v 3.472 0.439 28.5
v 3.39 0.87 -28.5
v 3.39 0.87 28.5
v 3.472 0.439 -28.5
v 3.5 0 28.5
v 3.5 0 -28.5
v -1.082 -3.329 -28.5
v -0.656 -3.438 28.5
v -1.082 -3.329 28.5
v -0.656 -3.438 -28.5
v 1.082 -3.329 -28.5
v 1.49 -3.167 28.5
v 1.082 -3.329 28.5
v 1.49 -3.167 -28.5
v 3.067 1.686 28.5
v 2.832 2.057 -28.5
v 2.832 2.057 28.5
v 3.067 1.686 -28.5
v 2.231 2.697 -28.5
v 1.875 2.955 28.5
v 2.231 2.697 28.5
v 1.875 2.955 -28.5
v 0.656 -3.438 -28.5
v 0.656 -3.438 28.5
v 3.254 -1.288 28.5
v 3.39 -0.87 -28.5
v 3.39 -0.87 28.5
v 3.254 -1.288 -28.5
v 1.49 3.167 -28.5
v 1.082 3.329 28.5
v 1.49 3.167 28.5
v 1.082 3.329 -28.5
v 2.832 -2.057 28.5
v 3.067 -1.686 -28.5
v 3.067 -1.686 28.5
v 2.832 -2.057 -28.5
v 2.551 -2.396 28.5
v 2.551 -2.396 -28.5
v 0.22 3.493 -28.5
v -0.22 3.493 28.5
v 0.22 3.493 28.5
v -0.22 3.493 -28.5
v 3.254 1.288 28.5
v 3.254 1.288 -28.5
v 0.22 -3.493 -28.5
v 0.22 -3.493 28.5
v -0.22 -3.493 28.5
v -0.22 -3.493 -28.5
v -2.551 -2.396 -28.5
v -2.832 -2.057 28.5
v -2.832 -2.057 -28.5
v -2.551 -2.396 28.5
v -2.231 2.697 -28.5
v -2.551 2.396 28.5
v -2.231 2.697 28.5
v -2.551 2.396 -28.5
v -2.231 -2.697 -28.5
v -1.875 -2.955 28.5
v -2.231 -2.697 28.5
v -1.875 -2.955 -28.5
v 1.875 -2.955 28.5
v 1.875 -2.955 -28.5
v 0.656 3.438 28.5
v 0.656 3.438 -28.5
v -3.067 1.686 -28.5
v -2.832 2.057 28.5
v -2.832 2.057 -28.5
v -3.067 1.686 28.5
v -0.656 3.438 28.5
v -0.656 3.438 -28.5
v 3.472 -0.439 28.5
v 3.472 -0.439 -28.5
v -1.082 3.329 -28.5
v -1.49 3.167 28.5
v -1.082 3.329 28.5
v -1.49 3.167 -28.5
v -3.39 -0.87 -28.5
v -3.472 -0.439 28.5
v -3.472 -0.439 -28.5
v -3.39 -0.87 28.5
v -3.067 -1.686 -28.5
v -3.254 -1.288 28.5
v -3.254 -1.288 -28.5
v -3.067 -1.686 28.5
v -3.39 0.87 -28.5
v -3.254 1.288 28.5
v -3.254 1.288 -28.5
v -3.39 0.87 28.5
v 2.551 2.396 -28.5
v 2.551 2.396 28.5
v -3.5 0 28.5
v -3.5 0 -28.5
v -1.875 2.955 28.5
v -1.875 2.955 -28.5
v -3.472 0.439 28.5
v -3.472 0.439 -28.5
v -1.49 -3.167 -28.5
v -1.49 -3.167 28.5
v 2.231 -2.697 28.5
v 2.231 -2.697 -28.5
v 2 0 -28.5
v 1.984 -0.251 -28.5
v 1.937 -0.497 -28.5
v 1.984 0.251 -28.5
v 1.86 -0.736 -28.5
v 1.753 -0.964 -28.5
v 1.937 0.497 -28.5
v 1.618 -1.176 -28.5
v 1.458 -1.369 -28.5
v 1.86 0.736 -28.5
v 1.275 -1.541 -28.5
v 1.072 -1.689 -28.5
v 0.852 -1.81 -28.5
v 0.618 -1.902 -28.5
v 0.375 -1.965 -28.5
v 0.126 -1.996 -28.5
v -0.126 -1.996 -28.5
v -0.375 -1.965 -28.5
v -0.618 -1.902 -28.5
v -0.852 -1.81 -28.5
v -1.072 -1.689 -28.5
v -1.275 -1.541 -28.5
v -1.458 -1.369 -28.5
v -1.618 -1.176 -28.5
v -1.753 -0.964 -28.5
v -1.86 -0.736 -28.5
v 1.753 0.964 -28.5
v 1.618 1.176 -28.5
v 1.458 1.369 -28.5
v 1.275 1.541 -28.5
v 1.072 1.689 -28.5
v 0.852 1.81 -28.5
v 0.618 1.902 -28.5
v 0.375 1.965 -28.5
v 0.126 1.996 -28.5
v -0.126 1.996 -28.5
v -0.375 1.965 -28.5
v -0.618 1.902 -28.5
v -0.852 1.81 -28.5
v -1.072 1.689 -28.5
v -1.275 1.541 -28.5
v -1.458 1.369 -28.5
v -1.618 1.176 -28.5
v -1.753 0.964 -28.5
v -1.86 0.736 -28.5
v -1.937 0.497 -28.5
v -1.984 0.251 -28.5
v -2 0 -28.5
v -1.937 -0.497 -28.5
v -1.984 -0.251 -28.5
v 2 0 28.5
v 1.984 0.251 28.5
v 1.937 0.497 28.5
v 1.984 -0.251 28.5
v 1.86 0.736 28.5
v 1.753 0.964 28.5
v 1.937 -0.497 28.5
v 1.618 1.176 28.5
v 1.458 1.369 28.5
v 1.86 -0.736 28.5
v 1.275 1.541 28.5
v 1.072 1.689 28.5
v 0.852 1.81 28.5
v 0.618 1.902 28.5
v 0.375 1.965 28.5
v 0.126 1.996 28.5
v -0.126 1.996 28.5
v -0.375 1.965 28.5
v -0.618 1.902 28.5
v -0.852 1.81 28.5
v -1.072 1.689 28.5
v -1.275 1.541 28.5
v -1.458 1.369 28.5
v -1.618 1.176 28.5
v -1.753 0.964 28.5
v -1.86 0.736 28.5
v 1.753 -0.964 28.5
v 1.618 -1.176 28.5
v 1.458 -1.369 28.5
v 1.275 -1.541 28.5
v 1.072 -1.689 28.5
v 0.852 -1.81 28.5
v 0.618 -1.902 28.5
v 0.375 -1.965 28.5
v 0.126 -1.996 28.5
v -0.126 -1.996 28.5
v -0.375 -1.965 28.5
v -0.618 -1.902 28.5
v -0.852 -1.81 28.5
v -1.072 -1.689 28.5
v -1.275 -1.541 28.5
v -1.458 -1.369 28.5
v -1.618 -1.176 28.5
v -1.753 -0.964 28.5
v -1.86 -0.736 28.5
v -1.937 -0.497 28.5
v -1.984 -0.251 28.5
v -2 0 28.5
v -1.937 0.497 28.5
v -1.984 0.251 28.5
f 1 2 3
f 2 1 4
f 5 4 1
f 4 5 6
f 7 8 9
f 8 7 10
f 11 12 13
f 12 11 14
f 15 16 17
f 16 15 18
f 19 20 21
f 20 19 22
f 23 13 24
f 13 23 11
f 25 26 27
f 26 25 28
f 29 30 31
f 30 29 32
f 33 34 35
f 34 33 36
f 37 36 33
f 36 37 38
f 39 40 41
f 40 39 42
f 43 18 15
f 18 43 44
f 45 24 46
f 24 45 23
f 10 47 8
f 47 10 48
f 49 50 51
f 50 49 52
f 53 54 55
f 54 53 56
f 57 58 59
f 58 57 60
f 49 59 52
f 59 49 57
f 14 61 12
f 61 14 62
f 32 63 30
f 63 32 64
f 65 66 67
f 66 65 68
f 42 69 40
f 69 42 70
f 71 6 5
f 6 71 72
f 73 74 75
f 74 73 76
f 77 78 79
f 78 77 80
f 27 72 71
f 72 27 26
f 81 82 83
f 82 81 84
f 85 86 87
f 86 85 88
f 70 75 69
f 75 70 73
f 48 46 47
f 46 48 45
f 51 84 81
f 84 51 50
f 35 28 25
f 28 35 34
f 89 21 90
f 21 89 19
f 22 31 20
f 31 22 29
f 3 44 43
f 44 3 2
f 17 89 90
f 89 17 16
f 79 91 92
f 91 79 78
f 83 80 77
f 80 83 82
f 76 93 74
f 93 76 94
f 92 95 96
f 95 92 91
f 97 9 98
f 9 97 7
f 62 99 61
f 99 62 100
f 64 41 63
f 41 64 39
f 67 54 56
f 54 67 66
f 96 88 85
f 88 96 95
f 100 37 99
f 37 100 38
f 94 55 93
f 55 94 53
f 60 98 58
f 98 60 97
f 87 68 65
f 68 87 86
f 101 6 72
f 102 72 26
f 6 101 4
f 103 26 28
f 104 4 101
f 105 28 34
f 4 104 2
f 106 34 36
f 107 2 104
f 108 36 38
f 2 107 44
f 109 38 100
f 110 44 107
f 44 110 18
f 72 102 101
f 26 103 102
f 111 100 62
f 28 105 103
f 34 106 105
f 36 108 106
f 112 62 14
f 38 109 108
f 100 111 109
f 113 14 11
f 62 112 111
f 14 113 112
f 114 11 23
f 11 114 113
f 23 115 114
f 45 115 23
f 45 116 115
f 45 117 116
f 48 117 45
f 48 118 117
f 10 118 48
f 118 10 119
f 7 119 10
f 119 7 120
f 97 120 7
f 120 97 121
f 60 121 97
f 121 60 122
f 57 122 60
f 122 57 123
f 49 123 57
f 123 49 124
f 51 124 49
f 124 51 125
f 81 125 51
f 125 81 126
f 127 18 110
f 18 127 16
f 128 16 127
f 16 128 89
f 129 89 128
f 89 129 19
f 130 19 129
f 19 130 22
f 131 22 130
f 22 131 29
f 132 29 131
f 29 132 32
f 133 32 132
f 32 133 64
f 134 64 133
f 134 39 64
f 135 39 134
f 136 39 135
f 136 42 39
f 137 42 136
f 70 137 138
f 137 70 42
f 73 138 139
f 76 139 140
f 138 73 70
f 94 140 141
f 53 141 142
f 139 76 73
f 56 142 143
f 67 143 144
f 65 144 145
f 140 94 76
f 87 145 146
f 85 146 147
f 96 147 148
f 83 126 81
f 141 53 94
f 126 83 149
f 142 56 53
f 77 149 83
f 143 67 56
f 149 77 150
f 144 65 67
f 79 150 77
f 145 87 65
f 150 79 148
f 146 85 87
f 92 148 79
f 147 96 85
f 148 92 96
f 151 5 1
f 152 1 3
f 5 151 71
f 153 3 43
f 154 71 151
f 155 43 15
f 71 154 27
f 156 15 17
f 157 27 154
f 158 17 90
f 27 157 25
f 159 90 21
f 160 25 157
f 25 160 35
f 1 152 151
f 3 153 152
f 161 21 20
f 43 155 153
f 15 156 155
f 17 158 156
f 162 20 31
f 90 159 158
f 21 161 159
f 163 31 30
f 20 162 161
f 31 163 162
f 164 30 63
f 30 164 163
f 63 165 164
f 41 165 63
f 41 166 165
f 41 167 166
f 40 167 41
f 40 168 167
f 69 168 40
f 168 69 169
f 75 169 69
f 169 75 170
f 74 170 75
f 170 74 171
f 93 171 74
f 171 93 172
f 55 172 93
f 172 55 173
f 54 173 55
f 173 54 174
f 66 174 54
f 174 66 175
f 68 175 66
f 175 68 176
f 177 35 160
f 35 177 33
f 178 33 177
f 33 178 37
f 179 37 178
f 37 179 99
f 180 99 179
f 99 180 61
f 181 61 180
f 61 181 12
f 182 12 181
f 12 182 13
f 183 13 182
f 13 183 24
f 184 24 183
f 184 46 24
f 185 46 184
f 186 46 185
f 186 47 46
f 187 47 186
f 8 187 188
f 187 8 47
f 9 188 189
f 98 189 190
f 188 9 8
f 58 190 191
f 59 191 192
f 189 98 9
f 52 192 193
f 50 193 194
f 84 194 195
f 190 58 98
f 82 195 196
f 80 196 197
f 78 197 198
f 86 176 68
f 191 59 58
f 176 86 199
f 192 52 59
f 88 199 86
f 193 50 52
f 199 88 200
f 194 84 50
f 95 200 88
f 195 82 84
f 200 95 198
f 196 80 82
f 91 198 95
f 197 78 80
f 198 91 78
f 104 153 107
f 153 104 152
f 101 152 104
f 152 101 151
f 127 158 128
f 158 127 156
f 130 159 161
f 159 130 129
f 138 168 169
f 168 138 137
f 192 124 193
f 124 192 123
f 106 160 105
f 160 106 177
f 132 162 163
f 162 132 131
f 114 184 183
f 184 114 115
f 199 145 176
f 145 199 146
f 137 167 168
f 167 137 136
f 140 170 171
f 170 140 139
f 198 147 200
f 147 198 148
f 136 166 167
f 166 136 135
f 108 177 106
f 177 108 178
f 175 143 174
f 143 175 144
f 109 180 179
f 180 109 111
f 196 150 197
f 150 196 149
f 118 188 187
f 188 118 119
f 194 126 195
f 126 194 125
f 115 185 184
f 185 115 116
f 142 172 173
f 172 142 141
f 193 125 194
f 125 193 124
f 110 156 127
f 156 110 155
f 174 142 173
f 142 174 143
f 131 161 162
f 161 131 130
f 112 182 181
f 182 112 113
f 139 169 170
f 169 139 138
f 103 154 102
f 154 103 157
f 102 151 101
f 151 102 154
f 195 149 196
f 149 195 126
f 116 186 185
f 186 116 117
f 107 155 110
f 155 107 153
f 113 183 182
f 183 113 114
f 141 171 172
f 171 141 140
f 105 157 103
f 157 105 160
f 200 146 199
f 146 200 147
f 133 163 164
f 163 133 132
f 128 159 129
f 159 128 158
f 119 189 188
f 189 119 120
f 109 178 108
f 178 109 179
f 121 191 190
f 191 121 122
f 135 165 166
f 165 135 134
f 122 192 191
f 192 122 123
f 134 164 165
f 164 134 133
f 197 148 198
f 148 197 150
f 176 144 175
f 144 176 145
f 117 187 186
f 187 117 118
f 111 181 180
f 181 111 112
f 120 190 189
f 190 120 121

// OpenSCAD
$fn = 50;


difference() {
	union() {
		translate(v = [0, 0, -28.5000000000]) {
			cylinder(h = 57, r = 3.5000000000);
		}
	}
	union() {
		translate(v = [0, 0, -100.0000000000]) {
			cylinder(h = 200, r = 2.0000000000);
		}
	}
}
